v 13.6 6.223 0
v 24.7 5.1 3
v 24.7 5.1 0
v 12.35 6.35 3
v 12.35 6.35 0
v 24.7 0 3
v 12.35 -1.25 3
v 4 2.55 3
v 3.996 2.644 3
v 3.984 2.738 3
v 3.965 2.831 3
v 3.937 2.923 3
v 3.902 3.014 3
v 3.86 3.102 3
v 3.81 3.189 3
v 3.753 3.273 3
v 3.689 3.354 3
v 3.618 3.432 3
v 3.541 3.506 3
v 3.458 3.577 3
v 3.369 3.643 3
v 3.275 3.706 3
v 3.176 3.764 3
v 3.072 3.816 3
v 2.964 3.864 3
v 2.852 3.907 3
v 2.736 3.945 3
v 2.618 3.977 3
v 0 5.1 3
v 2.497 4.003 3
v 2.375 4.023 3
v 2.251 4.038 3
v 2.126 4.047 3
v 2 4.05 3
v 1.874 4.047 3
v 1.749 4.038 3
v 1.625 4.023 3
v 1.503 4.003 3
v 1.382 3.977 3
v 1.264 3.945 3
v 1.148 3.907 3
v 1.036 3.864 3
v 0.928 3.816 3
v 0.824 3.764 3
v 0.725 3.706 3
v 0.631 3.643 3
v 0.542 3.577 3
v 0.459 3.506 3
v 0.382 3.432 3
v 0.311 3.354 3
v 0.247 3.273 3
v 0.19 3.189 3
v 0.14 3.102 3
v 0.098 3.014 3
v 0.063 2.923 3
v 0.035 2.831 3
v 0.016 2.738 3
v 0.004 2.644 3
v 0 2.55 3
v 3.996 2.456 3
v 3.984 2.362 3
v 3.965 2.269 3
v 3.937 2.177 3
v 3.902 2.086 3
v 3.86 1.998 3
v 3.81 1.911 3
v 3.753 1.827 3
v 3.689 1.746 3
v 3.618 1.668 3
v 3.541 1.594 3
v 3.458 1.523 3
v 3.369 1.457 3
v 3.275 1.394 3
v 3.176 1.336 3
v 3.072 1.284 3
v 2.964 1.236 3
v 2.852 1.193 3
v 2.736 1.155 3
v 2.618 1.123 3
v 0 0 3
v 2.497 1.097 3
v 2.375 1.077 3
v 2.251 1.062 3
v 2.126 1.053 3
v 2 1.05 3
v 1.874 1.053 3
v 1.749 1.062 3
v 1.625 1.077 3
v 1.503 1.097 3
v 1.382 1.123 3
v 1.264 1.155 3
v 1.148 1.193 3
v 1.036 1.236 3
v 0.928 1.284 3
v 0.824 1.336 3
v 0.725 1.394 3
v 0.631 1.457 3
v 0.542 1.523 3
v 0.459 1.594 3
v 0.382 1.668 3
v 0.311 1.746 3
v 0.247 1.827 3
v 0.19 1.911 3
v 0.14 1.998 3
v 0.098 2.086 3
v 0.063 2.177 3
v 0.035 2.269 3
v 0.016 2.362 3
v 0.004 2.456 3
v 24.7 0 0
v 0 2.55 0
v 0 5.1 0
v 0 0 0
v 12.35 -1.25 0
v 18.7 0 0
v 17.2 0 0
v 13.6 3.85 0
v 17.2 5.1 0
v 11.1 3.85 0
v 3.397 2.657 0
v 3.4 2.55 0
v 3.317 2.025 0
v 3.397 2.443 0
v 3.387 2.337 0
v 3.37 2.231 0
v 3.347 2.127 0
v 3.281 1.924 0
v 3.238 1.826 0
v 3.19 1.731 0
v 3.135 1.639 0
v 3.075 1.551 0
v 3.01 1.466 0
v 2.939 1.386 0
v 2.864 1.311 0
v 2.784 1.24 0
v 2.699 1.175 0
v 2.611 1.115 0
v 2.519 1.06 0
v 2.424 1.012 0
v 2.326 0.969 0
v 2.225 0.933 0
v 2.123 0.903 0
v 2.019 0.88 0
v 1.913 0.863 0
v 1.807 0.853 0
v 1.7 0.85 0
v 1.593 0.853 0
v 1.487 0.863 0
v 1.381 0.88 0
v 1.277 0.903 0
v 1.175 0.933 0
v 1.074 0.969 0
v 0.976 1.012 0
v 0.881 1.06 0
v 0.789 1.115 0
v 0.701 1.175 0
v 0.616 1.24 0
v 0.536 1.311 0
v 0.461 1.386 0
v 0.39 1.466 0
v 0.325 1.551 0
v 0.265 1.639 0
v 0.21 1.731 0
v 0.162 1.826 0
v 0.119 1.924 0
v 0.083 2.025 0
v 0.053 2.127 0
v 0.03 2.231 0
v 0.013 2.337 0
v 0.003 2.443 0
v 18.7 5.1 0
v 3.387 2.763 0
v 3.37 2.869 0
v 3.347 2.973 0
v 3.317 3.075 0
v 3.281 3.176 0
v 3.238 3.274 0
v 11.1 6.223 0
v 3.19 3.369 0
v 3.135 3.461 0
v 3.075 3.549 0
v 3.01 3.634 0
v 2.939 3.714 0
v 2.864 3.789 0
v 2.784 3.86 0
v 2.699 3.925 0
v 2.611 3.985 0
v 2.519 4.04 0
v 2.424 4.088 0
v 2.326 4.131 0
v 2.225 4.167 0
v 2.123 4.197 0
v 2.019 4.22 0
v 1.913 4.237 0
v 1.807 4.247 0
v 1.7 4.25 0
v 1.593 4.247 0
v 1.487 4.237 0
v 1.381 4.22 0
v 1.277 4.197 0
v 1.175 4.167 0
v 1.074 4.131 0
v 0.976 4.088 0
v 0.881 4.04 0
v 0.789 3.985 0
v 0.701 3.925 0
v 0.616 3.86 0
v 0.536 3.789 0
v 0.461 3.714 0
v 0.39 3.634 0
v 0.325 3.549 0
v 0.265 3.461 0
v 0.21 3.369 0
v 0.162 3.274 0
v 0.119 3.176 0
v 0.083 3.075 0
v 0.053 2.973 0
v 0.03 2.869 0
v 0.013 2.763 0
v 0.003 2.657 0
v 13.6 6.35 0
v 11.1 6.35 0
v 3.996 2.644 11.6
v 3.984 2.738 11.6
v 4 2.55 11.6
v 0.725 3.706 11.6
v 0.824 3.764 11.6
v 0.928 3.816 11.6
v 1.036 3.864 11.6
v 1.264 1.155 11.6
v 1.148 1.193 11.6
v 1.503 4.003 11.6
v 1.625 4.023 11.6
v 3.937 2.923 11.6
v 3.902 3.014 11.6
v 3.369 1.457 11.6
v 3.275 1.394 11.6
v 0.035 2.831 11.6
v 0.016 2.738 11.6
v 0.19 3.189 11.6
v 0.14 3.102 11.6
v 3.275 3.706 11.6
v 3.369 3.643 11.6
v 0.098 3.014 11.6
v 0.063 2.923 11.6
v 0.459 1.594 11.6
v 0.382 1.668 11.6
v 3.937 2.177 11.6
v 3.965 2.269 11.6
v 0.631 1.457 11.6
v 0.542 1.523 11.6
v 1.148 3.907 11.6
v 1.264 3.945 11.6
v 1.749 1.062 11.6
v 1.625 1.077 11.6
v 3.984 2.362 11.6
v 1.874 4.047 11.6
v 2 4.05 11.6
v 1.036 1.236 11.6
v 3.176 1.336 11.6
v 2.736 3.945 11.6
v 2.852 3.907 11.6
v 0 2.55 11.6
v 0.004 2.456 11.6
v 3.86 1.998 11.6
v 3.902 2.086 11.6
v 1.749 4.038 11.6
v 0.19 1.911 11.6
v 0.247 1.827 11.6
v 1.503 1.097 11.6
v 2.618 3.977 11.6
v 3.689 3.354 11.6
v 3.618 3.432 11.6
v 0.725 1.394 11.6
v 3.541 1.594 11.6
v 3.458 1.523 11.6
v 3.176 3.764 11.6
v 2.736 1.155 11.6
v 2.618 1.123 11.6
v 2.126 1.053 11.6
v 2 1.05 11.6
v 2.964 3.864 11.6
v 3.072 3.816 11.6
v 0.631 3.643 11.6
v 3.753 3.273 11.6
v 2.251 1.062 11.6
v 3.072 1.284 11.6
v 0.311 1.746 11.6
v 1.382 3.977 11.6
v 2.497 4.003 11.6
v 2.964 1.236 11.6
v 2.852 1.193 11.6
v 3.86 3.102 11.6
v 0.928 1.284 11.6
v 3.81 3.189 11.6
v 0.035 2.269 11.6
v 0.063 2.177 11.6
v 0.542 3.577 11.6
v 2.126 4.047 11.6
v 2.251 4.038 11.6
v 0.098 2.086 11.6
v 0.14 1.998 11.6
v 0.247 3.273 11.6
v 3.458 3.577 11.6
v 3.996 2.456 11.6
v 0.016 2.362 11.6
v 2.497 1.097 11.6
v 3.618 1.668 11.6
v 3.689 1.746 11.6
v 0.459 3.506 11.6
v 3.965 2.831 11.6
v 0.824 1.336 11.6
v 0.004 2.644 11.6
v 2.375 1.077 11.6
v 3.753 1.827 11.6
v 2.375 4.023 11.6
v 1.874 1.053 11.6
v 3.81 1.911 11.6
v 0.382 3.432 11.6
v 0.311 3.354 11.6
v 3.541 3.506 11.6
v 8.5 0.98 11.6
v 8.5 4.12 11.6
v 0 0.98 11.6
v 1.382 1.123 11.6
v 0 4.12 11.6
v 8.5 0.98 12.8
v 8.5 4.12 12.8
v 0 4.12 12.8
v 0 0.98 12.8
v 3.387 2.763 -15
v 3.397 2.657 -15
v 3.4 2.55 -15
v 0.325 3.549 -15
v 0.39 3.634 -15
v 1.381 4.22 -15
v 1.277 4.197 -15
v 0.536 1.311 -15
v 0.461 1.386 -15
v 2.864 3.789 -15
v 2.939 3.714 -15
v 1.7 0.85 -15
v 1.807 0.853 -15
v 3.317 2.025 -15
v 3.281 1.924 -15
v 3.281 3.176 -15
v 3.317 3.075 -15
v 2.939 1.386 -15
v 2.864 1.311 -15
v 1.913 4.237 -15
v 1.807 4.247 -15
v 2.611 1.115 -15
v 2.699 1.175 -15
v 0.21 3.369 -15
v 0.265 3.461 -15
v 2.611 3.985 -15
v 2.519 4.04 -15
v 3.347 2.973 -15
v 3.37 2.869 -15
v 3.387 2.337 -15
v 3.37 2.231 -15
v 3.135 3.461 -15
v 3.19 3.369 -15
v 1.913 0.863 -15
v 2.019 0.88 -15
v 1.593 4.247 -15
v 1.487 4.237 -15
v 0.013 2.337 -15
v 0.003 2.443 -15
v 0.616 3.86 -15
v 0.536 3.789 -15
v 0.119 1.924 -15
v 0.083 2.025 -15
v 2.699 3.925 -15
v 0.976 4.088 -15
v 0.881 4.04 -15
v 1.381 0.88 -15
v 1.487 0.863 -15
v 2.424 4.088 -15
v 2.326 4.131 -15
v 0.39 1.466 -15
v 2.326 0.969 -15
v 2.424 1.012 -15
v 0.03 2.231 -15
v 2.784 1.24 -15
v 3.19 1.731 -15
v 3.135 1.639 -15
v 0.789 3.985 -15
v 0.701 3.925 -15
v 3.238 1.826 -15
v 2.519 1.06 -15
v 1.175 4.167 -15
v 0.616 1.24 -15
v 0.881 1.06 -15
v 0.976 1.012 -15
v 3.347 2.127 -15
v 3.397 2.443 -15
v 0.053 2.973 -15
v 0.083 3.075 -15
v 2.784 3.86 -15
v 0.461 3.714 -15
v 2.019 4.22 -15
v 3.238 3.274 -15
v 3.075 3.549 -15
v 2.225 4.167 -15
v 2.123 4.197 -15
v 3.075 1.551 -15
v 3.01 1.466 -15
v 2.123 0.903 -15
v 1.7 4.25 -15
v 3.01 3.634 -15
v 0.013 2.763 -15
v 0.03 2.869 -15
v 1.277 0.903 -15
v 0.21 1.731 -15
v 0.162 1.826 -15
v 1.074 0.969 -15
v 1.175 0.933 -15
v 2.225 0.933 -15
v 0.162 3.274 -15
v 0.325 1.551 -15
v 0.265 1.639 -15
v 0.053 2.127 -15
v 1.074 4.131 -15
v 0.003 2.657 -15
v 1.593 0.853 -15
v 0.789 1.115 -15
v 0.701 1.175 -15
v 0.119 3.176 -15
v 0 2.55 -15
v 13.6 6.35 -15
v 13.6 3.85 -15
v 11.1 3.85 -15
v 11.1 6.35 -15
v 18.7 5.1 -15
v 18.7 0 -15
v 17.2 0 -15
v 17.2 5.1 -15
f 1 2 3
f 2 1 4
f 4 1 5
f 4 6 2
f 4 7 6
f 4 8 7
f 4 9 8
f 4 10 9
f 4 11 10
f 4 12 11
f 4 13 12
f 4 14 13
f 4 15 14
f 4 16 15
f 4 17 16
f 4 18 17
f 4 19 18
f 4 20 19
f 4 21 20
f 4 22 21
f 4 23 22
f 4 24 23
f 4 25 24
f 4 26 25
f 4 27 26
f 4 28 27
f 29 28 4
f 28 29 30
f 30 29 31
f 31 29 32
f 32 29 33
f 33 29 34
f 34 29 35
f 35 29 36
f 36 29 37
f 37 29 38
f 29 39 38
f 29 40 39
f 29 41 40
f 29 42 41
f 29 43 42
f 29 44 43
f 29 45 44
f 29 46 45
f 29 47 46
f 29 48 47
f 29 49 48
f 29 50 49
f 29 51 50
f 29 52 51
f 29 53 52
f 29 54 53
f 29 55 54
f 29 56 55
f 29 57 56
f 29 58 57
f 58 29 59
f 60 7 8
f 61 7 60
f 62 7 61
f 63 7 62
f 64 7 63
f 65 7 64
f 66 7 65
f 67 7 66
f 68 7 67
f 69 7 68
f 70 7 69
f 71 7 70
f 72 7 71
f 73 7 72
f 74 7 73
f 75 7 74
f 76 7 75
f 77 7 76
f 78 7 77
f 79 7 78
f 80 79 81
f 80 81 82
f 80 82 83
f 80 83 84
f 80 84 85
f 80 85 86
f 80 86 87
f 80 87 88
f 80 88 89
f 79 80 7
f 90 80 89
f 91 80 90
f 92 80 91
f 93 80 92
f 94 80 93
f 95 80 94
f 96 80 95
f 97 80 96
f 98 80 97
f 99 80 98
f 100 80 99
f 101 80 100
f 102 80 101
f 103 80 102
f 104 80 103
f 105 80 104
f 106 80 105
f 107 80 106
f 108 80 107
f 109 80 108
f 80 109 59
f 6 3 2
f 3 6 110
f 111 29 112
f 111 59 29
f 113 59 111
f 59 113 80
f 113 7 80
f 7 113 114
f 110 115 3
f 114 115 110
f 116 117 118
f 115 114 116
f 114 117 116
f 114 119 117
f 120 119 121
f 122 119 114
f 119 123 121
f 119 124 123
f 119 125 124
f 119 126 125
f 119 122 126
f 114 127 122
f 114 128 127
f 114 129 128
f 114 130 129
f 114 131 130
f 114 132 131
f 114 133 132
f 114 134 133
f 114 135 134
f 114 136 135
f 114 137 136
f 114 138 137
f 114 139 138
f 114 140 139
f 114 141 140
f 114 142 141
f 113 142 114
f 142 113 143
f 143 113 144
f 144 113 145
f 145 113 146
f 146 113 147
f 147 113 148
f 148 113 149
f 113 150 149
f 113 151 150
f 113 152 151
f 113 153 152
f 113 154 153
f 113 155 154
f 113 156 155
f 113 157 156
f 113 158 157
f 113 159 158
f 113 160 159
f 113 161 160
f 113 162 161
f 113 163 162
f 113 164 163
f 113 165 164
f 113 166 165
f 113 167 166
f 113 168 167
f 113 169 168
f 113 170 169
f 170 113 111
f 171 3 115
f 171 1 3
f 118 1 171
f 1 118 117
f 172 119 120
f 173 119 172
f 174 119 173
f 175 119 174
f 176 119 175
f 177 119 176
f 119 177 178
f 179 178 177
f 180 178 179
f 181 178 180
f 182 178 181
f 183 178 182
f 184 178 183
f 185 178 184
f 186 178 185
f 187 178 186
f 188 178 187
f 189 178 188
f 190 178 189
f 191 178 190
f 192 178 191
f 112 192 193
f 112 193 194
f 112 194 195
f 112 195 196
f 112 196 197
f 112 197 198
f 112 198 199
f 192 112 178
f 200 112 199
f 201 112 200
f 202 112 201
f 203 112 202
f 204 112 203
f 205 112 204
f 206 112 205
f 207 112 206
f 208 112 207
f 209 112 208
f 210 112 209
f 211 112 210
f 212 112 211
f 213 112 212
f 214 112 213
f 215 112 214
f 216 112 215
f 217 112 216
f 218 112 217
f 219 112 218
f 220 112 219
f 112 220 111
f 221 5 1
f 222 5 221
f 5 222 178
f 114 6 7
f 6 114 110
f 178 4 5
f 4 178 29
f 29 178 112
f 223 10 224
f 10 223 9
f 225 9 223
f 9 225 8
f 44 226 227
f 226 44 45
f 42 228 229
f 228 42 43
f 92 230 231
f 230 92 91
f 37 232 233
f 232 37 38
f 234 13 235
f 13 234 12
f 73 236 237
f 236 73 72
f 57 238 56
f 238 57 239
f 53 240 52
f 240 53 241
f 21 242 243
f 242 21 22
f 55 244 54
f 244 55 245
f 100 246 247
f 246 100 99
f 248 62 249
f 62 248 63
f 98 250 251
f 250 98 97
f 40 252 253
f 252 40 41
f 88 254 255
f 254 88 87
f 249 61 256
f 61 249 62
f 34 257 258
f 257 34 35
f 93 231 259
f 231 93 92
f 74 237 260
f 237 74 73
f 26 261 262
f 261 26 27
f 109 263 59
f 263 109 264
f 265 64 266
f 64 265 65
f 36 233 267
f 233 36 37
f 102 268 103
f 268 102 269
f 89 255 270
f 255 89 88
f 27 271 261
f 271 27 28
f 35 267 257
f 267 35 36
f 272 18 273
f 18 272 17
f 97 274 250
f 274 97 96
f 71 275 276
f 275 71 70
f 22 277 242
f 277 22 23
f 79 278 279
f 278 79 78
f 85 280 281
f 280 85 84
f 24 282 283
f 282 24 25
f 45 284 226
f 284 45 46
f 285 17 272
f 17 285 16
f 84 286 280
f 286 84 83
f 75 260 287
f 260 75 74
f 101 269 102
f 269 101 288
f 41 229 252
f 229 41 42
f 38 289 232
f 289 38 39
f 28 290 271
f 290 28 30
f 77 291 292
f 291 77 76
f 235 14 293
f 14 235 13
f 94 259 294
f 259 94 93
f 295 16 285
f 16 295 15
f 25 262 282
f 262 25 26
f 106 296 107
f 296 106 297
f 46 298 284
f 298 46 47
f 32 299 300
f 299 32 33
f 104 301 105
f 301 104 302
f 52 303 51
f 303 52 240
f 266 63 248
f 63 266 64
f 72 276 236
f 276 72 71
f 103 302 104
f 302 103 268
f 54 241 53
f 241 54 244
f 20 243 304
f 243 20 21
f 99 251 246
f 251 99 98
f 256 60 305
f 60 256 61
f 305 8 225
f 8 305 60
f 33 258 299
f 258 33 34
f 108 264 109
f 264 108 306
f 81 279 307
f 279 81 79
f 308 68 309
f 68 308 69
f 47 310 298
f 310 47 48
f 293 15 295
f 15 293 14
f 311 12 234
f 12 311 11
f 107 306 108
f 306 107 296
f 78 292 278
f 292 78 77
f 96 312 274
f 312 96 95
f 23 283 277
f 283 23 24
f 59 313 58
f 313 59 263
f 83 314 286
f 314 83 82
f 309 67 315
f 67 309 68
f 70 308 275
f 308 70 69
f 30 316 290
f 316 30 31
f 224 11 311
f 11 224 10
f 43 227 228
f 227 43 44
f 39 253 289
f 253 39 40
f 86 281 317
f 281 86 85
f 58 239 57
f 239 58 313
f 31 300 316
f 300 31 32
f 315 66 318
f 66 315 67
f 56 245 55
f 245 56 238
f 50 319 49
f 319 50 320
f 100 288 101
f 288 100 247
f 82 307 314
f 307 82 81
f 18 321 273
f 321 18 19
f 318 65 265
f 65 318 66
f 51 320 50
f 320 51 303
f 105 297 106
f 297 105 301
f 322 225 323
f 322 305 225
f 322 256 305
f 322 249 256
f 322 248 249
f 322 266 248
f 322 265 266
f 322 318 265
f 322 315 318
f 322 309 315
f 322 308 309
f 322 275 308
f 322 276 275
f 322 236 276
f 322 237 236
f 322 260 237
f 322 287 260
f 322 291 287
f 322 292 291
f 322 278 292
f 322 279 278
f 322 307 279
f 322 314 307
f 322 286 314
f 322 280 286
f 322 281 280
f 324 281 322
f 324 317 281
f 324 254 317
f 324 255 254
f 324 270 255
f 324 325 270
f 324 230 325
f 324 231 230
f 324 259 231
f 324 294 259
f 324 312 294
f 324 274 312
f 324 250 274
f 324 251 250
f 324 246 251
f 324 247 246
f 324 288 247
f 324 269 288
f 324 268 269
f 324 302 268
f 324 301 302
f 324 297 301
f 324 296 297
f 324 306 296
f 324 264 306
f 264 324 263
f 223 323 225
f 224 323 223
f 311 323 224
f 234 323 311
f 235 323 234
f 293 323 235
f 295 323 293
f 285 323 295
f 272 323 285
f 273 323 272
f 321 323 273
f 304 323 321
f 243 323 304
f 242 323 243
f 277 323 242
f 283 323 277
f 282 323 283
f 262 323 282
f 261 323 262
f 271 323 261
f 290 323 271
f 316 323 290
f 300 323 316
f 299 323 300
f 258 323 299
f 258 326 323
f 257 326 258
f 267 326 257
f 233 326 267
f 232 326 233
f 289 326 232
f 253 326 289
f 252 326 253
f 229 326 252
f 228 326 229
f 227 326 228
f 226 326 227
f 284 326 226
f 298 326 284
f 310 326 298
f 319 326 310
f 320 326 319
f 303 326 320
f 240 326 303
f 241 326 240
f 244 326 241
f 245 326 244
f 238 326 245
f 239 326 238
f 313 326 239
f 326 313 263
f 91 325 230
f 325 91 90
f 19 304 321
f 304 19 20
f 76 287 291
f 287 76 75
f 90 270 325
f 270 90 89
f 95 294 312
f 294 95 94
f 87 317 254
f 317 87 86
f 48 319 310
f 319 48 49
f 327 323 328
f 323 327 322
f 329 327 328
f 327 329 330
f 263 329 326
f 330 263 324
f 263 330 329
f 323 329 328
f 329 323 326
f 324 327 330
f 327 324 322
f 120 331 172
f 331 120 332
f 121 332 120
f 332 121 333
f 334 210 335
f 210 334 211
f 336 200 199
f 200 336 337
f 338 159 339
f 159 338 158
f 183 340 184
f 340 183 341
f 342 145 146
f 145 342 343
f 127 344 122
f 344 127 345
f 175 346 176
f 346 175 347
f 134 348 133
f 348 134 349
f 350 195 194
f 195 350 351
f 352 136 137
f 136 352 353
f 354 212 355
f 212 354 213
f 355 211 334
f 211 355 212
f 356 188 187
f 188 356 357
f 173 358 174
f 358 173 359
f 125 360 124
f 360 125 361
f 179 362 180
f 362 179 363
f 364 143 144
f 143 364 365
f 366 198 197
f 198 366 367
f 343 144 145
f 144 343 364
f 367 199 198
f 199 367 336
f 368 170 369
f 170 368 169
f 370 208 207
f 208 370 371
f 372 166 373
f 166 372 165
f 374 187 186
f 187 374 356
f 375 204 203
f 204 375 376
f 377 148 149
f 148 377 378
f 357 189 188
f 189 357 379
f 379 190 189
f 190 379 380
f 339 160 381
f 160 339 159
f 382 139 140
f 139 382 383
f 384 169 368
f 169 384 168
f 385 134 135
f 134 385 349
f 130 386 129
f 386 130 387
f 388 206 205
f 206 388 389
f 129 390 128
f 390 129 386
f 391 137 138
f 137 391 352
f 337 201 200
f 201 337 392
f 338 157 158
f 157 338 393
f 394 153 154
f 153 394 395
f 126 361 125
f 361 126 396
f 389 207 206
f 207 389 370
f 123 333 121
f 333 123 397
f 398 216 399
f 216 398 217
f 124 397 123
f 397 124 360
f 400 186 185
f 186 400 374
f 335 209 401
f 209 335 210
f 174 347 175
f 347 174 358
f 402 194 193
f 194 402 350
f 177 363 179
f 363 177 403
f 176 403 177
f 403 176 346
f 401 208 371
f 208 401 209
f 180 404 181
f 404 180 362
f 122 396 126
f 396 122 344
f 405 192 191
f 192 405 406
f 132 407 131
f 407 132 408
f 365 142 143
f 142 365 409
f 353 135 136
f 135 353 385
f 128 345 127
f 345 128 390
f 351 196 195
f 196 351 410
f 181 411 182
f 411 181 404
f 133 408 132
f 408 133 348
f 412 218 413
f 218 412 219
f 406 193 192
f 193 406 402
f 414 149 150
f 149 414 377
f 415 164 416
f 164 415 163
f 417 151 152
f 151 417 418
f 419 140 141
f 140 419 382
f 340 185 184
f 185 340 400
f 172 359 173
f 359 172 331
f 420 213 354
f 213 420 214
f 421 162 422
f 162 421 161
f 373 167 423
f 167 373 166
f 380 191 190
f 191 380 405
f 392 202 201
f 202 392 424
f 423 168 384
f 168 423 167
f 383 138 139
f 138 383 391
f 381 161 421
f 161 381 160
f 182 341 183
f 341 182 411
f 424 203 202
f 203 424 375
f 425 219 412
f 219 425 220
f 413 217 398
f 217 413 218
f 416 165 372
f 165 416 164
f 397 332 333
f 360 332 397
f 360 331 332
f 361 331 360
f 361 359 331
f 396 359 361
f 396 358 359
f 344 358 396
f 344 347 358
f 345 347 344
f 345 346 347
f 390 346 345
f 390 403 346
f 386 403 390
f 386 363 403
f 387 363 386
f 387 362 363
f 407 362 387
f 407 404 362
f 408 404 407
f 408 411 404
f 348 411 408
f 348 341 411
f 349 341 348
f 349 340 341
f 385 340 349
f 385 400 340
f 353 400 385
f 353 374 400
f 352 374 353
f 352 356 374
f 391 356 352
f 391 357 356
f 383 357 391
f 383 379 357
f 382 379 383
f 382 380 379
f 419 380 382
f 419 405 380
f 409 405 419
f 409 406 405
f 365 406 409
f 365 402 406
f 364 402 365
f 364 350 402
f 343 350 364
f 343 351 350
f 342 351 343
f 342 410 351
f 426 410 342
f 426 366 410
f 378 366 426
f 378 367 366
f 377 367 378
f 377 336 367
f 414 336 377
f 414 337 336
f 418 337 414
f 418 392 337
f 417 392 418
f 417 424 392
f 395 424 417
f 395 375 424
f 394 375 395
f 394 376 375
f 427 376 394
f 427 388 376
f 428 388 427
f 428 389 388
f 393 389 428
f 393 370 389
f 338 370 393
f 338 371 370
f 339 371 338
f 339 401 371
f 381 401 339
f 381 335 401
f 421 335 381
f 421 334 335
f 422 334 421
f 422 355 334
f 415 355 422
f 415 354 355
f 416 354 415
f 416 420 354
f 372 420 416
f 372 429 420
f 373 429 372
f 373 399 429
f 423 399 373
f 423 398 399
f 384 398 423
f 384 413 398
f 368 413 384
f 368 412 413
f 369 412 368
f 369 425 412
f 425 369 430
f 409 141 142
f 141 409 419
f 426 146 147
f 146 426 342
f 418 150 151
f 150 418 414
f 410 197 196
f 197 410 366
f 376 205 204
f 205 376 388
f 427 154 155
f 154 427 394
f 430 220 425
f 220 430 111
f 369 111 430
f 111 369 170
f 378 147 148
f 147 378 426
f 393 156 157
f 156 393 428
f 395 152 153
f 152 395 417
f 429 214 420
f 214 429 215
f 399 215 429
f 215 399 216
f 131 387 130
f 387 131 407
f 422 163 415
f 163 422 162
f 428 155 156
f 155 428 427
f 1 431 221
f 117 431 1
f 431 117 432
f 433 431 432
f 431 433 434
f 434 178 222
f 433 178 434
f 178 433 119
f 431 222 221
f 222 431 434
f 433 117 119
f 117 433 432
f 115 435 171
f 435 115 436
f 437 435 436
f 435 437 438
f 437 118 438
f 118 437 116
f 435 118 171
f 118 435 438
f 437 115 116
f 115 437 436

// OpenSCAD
platform_depth = 3.00; // mm
platform_width_middle = 7.60; // mm
platform_width_outer = 5.10; // mm
platform_width_diff = platform_width_middle - platform_width_outer;
platform_length = 24.7;

$fn = 100;

oberer_staengel = 8.6;
oberer_staengel_r1 = 3;
oberer_staengel_r2 = 4;
oberer_staengel_p = 8.5;
oberer_staengel_w = 1.2;

unterer_staengel_d = 3.4;
unterer_staengel_l = 15;

q_staengel_w = 2.5;

f_staengel_w = 1.5;
f_staengel_d = 5.1;
f_staengel_ofs = 17.2;

// plattform
linear_extrude(height=platform_depth)
    polygon( [
        [0,0], [0,platform_width_outer], 
        [platform_length/2,platform_width_outer+platform_width_diff/2], 
        [platform_length,platform_width_outer],
        [platform_length, 0],
        [platform_length/2,-platform_width_diff/2],
    ]);

// oberer staengel
translate([oberer_staengel_r2/2,platform_width_outer/2,0]) {
scale([ 1.0, (oberer_staengel_r1/oberer_staengel_r2), 1.0])
cylinder(h=oberer_staengel+platform_depth,
    d=oberer_staengel_r2);
};
translate([0,(platform_width_outer-3.14)/2,oberer_staengel+platform_depth])
cube([oberer_staengel_p, 3.14, oberer_staengel_w]);

// unterer staengel
translate([unterer_staengel_d/2,platform_width_outer/2,-unterer_staengel_l])
cylinder(h = unterer_staengel_l, d=unterer_staengel_d);


// quadratischer staengel
translate([platform_length/2-q_staengel_w/2,platform_width_outer+platform_width_diff/2-q_staengel_w,-unterer_staengel_l])
cube([q_staengel_w,q_staengel_w,unterer_staengel_l]);

// flacher staengel
translate([f_staengel_ofs,0,-unterer_staengel_l])
cube([f_staengel_w, f_staengel_d, unterer_staengel_l]);
